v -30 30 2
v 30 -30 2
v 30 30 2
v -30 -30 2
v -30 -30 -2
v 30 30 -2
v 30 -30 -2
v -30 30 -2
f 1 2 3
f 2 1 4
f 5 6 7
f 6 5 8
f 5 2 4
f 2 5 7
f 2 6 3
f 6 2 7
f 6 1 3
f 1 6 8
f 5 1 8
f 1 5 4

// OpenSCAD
module plateau_carre()
{
	cube(size = [60,60,4], center = true);
}

plateau_carre();
